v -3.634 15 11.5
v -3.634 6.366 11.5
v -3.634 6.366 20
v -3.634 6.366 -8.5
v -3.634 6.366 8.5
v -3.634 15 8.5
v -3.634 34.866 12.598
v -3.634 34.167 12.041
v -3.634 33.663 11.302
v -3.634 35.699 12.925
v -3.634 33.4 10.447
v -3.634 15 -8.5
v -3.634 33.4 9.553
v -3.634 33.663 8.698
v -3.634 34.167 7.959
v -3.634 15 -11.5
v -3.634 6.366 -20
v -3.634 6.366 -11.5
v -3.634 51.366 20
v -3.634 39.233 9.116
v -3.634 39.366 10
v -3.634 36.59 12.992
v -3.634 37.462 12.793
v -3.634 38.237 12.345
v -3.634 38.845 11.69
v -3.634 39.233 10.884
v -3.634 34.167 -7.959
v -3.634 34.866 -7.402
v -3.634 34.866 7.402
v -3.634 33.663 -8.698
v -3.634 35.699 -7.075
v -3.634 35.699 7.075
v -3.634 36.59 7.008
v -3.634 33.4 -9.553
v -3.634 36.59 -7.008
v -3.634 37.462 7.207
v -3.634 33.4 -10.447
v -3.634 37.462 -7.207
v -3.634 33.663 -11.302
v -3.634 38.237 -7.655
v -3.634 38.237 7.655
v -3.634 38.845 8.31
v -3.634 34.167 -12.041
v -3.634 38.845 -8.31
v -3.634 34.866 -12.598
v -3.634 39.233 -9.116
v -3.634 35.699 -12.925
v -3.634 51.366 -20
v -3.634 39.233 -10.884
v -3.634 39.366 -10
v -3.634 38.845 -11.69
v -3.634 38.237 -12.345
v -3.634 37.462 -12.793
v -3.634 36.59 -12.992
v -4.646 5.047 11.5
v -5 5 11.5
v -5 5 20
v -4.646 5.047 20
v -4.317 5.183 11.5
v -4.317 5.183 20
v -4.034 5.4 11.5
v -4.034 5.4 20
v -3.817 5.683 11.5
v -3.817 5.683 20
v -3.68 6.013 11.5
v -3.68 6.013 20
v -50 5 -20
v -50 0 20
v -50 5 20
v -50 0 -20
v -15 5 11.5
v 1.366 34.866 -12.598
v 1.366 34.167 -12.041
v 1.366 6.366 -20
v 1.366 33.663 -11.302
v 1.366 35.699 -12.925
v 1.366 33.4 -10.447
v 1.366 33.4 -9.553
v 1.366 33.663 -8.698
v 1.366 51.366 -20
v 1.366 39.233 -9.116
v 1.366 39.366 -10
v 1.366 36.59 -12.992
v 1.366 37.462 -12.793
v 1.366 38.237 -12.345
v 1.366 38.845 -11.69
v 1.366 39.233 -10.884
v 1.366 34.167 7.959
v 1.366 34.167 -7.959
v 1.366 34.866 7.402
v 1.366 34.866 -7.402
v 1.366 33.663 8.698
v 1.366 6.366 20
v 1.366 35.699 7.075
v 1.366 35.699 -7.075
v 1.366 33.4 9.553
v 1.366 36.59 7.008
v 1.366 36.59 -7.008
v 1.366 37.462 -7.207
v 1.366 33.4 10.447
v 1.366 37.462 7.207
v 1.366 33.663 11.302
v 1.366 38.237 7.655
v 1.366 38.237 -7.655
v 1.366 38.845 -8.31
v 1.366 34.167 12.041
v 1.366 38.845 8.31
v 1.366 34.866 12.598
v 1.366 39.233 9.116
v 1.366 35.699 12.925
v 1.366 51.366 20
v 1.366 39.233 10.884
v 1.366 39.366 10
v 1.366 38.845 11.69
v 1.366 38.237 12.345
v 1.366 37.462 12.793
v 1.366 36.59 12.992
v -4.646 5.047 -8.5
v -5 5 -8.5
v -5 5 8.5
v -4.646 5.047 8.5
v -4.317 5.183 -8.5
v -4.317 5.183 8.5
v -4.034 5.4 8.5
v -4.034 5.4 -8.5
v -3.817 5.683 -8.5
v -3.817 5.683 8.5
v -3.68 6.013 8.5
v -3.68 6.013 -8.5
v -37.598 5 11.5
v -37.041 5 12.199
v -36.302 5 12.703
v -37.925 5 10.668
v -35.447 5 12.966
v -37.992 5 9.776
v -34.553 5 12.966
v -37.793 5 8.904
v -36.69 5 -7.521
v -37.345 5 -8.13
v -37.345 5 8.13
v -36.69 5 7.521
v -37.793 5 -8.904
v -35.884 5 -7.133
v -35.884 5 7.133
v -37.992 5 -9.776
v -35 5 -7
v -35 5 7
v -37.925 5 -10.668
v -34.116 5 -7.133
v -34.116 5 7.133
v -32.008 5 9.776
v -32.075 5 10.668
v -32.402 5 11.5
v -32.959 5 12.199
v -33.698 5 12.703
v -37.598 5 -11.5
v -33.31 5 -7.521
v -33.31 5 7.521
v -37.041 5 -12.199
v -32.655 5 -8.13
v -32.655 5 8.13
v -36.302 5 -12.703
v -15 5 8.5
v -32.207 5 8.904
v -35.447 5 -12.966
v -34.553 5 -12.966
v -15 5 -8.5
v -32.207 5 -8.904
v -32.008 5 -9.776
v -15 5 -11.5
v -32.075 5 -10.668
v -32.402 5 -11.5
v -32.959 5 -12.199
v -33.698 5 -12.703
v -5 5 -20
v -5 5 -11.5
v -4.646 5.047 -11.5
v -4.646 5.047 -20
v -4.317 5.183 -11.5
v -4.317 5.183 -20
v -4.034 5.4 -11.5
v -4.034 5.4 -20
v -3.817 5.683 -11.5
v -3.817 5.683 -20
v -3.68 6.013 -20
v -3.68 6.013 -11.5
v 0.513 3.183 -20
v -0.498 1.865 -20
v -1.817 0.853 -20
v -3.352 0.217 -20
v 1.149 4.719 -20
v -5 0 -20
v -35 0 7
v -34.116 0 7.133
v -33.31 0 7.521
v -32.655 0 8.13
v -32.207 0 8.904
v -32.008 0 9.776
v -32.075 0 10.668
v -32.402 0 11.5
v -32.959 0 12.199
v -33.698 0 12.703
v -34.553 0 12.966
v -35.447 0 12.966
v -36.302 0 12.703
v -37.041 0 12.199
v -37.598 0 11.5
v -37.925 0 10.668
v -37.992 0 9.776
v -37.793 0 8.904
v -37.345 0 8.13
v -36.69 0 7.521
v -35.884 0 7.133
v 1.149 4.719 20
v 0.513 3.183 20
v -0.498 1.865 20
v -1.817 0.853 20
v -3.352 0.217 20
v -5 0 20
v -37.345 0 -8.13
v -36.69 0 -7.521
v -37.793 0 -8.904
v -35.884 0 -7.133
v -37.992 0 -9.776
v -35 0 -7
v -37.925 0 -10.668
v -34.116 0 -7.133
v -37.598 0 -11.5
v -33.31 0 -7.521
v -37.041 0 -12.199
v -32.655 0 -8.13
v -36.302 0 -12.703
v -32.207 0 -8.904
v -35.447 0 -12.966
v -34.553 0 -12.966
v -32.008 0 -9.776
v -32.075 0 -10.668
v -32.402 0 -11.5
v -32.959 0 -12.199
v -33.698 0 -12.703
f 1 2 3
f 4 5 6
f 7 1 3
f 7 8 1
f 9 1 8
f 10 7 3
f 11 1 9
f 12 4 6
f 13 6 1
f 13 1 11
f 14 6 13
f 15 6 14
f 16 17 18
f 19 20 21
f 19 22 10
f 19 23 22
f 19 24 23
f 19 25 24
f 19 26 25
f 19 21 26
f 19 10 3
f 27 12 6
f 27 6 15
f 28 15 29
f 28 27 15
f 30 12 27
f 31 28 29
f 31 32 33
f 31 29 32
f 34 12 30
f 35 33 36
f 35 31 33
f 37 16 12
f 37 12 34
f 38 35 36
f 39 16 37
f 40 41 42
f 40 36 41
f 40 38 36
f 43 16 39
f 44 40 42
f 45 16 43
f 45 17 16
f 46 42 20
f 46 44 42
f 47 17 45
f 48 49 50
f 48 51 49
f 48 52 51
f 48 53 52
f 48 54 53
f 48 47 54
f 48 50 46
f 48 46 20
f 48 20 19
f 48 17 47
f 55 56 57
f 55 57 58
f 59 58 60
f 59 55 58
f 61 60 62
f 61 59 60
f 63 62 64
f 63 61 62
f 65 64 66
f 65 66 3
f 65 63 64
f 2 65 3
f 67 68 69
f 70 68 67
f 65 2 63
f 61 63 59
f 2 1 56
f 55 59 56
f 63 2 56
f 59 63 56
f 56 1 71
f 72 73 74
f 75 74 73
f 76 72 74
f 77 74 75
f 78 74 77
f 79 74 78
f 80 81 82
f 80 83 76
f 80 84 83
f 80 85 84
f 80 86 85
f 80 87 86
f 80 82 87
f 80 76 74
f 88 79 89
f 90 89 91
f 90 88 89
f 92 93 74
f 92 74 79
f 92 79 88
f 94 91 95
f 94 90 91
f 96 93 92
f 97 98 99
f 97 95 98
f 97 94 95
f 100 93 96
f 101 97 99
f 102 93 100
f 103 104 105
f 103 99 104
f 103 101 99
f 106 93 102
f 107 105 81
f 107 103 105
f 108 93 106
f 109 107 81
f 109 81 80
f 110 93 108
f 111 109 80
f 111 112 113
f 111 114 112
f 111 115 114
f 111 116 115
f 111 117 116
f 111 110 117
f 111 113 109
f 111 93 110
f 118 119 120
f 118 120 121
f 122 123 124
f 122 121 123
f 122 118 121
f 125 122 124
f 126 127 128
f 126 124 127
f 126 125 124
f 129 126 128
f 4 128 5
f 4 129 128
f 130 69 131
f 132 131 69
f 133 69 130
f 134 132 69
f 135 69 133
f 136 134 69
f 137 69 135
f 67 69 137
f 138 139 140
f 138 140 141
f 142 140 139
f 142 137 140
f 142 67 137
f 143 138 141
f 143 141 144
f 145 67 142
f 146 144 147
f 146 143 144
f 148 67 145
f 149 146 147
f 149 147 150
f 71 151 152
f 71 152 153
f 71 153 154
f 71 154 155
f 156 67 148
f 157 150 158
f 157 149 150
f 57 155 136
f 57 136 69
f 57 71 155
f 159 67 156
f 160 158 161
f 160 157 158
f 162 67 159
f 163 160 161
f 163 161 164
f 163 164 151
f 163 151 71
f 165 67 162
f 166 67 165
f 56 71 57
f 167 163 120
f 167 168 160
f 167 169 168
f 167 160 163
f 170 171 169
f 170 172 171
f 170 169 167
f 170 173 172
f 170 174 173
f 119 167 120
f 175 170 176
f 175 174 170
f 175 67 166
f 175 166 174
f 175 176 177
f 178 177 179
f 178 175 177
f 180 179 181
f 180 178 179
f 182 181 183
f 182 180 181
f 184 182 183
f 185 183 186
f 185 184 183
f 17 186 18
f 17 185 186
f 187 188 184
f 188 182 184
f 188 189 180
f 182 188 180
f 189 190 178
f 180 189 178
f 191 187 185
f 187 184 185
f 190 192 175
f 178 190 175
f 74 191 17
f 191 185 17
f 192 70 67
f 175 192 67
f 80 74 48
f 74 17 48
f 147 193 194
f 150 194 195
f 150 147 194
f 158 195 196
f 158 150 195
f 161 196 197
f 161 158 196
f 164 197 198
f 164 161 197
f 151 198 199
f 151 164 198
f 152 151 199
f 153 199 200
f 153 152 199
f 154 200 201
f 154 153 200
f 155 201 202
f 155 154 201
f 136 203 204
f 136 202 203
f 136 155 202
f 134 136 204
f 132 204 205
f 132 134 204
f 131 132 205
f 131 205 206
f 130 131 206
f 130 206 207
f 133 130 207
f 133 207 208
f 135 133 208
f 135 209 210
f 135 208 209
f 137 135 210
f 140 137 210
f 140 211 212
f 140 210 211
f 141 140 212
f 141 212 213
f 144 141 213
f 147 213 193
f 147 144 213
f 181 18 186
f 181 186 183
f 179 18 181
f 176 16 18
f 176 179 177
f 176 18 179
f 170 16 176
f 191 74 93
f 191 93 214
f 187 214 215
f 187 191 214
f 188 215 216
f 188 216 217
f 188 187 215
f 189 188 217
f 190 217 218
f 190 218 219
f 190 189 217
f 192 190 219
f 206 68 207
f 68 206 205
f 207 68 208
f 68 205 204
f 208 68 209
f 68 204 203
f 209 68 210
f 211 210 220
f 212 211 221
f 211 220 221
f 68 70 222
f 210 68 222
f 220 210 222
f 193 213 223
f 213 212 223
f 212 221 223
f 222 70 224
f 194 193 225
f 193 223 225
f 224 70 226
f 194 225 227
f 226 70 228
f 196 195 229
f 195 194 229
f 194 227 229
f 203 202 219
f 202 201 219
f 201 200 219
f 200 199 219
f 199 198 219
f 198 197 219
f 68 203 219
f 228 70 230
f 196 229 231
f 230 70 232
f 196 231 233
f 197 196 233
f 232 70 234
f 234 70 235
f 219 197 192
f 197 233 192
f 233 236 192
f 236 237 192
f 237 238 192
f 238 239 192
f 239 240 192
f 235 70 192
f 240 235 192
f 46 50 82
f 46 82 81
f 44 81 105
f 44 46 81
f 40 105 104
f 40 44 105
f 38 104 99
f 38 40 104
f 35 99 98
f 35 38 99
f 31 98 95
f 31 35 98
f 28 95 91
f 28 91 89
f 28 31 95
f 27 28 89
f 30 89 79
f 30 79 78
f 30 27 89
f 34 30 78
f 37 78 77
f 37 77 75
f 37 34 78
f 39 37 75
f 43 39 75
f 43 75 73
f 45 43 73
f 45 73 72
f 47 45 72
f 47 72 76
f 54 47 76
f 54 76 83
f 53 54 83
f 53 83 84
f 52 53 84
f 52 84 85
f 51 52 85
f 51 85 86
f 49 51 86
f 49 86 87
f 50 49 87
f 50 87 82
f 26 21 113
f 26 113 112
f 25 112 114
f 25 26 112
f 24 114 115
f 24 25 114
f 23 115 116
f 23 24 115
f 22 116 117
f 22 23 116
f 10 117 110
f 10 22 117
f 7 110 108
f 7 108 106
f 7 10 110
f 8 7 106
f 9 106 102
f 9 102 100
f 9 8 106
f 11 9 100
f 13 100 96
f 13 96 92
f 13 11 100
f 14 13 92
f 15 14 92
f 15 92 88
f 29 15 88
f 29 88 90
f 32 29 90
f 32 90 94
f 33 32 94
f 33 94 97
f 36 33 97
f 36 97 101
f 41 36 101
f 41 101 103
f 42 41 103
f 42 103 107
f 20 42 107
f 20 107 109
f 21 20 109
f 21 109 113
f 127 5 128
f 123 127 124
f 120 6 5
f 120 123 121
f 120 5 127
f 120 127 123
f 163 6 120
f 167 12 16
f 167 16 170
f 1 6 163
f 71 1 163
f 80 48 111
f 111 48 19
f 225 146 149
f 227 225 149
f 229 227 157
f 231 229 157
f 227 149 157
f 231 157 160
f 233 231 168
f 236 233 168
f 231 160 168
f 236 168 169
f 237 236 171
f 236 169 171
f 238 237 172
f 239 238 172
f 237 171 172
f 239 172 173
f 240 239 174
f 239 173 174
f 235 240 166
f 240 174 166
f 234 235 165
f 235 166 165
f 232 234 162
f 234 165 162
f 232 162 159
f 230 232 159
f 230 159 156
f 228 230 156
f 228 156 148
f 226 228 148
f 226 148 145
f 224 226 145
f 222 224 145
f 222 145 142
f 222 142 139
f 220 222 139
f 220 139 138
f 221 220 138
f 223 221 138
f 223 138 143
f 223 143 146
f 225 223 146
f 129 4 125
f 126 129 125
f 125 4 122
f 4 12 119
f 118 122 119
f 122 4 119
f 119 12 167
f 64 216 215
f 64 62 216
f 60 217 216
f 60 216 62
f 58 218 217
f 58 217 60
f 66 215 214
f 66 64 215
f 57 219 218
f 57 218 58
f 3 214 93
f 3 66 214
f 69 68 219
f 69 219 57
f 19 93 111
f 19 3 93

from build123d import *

# Parameters (mm, degrees)
SKETCH1_W                                  = 100
SKETCH1_H                                  = 40
BOSS_EXTRUDE1_DEPTH                        = 5
SKETCH2_R                                  = 3
CUT_EXTRUDE1_DEPTH                         = 55.083269132
MIRROR1_AT_THE_SECOND_PLANE_COPY_1_SKETC_R = 3
MIRROR1_AT_THE_SECOND_PLANE_COPY_1_DEPTH   = 55.083269132
FLEX1_START                                = 1.366197724
FLEX1_OUTLINE_W                            = 5
FLEX1_OUTLINE_H                            = 40
FLEX1_DEPTH                                = 48.633802276
FLEX1_START_2                              = -3.633802276
FLEX1_2_OUTLINE_W                          = 46.366197724
FLEX1_2_OUTLINE_H                          = 40
FLEX1_2_OUTLINE_R                          = 3
FLEX1_2_DEPTH                              = 3.907802276
FLEX1_START_3                              = -5
FLEX1_3_OUTLINE_W                          = 46.366197724
FLEX1_3_OUTLINE_H                          = 40
FLEX1_3_OUTLINE_R                          = 3
FLEX1_3_DEPTH                              = 6.366197724
FLEX1_START_4                              = -20
FLEX1_4_DEPTH                              = 40
RIB1_REACH                                 = 79.708
SKETCH3_WALL_W                             = 172.55443254
SKETCH3_WALL_H                             = 3


with BuildPart() as part:
    # Sketch1 → Boss-Extrude1 (new body)
    with BuildSketch(Plane(origin=(0, 0, 0), x_dir=(1, 0, 0), z_dir=(0, 1, 0))):
        Rectangle(SKETCH1_W, SKETCH1_H)
    extrude(amount=BOSS_EXTRUDE1_DEPTH)

    # Sketch2 → Cut-Extrude1 (cut, through all)
    with BuildSketch(Plane(origin=(0, 5, 0), x_dir=(1, 0, 0), z_dir=(0, 1, 0))):
        with Locations(Location((-35, 10, 0), (0, 0, 270))):
            Circle(SKETCH2_R)
    cut_extrude1 = extrude(amount=-CUT_EXTRUDE1_DEPTH, mode=Mode.SUBTRACT)

    # Mirror1: Cut-Extrude1 across plane
    add(cut_extrude1.mirror(Plane.XY), mode=Mode.SUBTRACT)

    # Mirror1 at the second plane: Cut-Extrude1 across plane
    add(cut_extrude1.mirror(Plane(origin=(0, 0, 0), x_dir=(0, 0, 1), z_dir=(1, 0, 0))), mode=Mode.SUBTRACT)

    # Mirror1 at the second plane copy 1 sketc → Mirror1 at the second plane copy 1 (cut, through all)
    with BuildSketch(Plane(origin=(0, 5, 0), x_dir=(-1, 0, 0), z_dir=(0, 1, 0))):
        with Locations(Location((-35, 10, 0), (0, 0, 270))):
            Circle(MIRROR1_AT_THE_SECOND_PLANE_COPY_1_SKETC_R)
    extrude(amount=-MIRROR1_AT_THE_SECOND_PLANE_COPY_1_DEPTH, mode=Mode.SUBTRACT)

    # Flex1: read off the stored shape, not the designer's step
    # Flex1 outline → Flex1 (cut)
    with BuildSketch(Plane.YZ.offset(FLEX1_START)):
        with Locations((2.5, 0)):
            Rectangle(FLEX1_OUTLINE_W, FLEX1_OUTLINE_H)
    extrude(amount=FLEX1_DEPTH, mode=Mode.SUBTRACT)

    # Flex1 2 outline → Flex1 2 (add)
    with BuildSketch(Plane.YZ.offset(FLEX1_START_2)):
        with Locations((28.183098862, 0)):
            Rectangle(FLEX1_2_OUTLINE_W, FLEX1_2_OUTLINE_H)
        with Locations((36.366197724, -10)):
            Circle(FLEX1_2_OUTLINE_R, mode=Mode.SUBTRACT)
        with Locations((36.366197724, 10)):
            Circle(FLEX1_2_OUTLINE_R, mode=Mode.SUBTRACT)
    extrude(amount=FLEX1_2_DEPTH)

    # Flex1 3 outline → Flex1 3 (add)
    with BuildSketch(Plane.YZ.offset(FLEX1_START_3)):
        with Locations((28.183098862, 0)):
            Rectangle(FLEX1_3_OUTLINE_W, FLEX1_3_OUTLINE_H)
        with Locations((36.366197724, -10)):
            Circle(FLEX1_3_OUTLINE_R, mode=Mode.SUBTRACT)
        with Locations((36.366197724, 10)):
            Circle(FLEX1_3_OUTLINE_R, mode=Mode.SUBTRACT)
    extrude(amount=FLEX1_3_DEPTH)

    # Flex1 4 outline → Flex1 4 (cut)
    with BuildSketch(Plane.XY.offset(FLEX1_START_4)):
        with BuildLine():
            Line((1.366197724, 0), (1.366197724, 6.366197724))
            ThreePointArc((1.366197724, 6.366197724), (-0.498418419, 1.864616143), (-5, 0))
            Line((-5, 0), (1.366197724, 0))
        make_face()
        with BuildLine():
            ThreePointArc((-5, 5), (-4.033952325, 5.400150049), (-3.633802276, 6.366197724))
            Line((-3.633802276, 6.366197724), (-3.633802276, 51.366197724))
            Line((-3.633802276, 51.366197724), (-5, 51.366197724))
            Line((-5, 51.366197724), (-5, 5))
        make_face()
    extrude(amount=FLEX1_4_DEPTH, mode=Mode.SUBTRACT)

    # Sketch3 wall → Rib1 (add, up to next)
    with BuildSketch(Plane(origin=(-9.316901138, 10, 10), x_dir=(-0.750787351307, -0.660543982727, 0), z_dir=(0.660543982727, -0.750787351307, 0)), mode=Mode.PRIVATE) as rib1_sk1:
        Rectangle(SKETCH3_WALL_W, SKETCH3_WALL_H)
    rib1_tool1 = extrude(rib1_sk1.sketch, amount=RIB1_REACH, mode=Mode.PRIVATE) - part.part
    rib1 = rib1_tool1.solids().sort_by_distance((-9.316901138, 10, 10))[0]
    add(rib1)

    # Mirror2: Rib1 across plane
    add(rib1.mirror(Plane.XY))


solid = part.part
